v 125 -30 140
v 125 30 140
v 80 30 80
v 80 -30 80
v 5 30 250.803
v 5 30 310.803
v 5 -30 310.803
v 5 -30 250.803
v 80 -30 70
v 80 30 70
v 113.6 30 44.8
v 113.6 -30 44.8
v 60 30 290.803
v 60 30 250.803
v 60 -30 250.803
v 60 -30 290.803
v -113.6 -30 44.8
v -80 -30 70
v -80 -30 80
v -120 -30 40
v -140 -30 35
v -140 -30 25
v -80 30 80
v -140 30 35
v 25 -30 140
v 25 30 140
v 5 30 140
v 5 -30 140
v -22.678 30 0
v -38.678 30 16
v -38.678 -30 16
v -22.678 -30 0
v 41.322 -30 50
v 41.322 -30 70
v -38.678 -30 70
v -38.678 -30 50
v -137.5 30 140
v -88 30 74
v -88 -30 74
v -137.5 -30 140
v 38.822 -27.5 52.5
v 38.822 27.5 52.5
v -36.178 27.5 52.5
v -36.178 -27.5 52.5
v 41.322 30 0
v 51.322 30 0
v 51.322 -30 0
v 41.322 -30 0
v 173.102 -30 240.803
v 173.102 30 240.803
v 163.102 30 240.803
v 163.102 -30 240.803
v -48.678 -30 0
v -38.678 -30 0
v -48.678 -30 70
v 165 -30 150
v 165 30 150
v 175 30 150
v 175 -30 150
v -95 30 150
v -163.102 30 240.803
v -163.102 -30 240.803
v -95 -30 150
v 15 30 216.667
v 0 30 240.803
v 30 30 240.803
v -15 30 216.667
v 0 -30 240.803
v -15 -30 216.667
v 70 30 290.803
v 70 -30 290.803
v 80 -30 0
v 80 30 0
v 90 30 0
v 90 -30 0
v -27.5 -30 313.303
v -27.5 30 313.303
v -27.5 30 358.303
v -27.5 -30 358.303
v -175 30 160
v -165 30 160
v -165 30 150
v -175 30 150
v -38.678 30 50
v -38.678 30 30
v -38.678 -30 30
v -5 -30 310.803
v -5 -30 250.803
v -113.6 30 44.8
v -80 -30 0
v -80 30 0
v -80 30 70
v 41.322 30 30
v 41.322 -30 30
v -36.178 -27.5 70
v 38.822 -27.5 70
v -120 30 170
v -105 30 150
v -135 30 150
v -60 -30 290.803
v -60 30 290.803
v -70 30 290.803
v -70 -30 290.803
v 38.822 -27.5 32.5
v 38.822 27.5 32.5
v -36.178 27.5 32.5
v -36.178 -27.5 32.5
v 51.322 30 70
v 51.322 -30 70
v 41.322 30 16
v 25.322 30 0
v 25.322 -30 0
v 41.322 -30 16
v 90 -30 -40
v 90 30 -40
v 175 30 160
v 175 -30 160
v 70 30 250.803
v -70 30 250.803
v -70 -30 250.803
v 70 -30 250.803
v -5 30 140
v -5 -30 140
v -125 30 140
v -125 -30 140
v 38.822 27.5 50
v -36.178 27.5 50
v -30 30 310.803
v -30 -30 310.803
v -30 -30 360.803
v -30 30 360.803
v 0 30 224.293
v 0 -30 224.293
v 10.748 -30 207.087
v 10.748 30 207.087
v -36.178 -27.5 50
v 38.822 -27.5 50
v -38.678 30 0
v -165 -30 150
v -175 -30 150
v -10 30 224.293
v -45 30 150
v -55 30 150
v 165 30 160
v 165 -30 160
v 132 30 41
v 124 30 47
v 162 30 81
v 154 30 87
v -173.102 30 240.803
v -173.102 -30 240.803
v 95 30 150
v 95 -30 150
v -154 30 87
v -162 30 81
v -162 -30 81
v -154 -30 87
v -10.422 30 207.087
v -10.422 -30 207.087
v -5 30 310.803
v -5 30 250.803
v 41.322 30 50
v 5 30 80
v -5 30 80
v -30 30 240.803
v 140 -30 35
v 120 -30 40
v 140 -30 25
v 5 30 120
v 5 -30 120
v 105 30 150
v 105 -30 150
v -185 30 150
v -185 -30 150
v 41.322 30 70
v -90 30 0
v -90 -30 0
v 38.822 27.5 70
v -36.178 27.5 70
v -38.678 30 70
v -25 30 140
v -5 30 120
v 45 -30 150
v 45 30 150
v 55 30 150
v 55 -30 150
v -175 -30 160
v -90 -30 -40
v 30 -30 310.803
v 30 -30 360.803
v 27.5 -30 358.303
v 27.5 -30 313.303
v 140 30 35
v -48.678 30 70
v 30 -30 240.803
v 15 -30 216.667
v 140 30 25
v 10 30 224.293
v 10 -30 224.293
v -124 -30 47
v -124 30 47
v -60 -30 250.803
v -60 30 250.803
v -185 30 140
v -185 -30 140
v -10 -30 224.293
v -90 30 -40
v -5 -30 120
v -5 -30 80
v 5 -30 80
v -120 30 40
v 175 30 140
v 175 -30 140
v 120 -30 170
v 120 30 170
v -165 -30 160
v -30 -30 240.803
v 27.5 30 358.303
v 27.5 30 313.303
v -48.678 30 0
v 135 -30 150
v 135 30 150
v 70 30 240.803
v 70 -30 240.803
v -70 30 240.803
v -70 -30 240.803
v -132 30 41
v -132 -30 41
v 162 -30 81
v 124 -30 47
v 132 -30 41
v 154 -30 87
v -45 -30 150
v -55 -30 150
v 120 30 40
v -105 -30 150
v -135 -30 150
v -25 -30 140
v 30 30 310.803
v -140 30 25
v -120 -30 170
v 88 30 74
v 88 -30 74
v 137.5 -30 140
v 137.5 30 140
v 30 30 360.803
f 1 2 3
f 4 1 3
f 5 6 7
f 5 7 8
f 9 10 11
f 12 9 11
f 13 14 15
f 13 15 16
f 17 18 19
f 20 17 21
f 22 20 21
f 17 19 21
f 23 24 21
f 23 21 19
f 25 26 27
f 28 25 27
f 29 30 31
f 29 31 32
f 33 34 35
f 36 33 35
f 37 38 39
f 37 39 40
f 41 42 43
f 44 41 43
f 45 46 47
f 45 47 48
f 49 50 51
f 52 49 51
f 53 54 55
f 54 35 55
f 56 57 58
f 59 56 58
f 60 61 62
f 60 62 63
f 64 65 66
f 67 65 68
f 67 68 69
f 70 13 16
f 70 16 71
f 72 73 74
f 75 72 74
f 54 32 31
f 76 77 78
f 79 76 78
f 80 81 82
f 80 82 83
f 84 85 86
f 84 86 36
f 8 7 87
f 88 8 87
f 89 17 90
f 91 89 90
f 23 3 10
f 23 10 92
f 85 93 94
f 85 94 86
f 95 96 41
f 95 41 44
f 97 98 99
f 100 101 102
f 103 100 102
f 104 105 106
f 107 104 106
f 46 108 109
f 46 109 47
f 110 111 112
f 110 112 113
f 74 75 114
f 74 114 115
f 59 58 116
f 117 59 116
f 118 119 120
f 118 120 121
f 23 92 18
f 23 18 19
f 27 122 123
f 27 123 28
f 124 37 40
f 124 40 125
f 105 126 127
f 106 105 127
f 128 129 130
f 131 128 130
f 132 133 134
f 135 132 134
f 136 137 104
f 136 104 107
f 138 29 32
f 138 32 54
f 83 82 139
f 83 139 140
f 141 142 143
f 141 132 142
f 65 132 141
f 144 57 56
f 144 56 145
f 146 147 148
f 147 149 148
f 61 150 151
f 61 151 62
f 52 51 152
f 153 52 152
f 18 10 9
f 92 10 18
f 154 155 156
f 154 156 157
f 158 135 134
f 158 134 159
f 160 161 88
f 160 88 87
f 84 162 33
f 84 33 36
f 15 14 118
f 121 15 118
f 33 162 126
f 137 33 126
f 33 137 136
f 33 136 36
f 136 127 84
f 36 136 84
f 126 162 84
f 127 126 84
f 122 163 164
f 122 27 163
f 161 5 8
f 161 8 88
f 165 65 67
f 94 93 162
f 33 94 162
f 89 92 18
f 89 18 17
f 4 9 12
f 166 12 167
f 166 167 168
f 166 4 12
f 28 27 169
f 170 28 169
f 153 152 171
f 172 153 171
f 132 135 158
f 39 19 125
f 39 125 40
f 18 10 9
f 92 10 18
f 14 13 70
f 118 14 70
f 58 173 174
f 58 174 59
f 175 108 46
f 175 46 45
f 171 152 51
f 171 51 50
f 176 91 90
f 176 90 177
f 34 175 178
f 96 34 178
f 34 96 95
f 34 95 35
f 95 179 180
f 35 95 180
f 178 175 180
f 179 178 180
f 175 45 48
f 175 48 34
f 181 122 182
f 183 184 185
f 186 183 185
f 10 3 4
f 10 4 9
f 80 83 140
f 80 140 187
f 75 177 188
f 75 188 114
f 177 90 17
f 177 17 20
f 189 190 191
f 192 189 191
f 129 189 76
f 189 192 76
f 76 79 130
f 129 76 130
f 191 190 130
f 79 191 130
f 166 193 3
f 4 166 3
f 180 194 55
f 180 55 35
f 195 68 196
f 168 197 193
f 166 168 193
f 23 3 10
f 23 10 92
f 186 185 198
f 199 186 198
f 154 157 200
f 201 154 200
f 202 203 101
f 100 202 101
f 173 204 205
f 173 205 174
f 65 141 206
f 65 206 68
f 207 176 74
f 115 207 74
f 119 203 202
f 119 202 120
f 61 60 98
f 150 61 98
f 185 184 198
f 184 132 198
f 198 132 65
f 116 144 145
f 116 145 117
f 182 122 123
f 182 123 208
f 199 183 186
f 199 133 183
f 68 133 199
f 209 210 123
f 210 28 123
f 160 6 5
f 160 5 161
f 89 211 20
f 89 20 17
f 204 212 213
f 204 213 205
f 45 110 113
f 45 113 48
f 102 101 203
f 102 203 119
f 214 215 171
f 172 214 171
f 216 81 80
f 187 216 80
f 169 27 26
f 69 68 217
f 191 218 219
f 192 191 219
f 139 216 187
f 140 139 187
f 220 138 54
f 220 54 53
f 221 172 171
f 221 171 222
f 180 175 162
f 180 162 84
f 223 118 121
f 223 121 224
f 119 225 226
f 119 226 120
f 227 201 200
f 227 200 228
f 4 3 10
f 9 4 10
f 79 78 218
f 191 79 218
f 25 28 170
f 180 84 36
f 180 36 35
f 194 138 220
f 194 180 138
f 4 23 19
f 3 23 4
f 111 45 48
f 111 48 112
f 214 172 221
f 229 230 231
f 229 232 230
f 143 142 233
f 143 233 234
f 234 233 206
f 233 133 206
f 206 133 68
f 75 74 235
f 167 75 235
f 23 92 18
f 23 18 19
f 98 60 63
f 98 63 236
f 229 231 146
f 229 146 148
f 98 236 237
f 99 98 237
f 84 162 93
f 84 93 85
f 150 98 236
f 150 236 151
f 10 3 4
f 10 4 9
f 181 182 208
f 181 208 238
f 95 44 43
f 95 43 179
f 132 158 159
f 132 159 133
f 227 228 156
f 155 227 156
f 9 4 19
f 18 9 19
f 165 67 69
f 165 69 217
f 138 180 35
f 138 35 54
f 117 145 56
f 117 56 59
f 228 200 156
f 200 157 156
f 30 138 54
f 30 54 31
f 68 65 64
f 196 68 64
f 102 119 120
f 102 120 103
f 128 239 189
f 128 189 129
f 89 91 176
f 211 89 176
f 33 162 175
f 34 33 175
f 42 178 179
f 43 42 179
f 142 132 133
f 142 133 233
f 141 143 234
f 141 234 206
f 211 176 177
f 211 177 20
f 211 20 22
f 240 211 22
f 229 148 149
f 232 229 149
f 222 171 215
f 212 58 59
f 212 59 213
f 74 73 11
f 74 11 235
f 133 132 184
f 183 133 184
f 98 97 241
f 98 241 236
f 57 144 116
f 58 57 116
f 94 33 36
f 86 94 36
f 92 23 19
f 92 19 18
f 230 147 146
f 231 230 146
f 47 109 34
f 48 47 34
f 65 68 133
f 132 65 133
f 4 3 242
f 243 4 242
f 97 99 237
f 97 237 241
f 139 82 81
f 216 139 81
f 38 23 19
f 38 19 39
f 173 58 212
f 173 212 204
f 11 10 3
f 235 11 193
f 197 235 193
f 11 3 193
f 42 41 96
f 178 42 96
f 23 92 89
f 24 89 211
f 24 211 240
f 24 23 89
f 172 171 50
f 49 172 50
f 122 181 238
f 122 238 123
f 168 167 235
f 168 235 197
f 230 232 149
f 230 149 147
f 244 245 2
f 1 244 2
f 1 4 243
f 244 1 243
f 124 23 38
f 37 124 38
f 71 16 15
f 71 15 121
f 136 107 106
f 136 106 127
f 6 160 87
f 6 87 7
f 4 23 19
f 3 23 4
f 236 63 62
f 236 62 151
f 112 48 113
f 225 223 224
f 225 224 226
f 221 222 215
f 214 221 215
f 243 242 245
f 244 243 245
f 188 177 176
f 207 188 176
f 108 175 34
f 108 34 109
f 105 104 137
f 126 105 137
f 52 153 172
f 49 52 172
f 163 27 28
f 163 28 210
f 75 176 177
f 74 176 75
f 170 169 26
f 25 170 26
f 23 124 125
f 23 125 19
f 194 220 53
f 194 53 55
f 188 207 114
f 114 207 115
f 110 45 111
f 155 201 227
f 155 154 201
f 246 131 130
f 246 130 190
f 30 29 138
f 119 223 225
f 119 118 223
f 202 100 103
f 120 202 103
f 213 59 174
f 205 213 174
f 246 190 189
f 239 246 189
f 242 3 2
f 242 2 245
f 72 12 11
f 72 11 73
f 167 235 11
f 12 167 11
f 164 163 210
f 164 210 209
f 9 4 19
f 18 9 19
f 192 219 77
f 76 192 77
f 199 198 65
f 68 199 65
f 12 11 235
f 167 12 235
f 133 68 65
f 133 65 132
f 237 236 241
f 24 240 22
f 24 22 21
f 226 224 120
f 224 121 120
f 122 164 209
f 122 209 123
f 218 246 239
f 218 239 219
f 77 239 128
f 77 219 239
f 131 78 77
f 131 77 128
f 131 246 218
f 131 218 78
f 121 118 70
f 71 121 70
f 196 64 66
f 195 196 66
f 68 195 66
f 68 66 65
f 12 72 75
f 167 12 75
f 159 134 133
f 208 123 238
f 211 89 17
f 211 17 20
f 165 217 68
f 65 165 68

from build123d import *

# Parameters (mm, degrees)
F0_W      = 180
F0_H      = 60
F1_DEPTH  = 40
F3_DEPTH  = 60
F2_W      = 10
F2_H      = 10
F2_W_2    = 80
F2_H_2    = 20
F5_DEPTH  = 60
F6_T      = -2.5
F7_DEPTH  = 60
F8_T      = -2.5
F9_DEPTH  = 60
F10_DEPTH = 60
F11_DEPTH = 60
F12_DEPTH = 60
F2_H_3    = 40
F14_DEPTH = 60
F15_T     = -2.5


with BuildPart() as f1:
    # F0 (on Top) → F1 (new body)
    with BuildSketch(Plane.XY):
        Rectangle(F0_W, F0_H)
    extrude(amount=-F1_DEPTH)


with BuildPart() as f3:
    # F2 (on face) → F3 (new body)
    with BuildSketch(Plane(origin=(0, 30, 0), x_dir=(-1, 0, 0), z_dir=(0, 1, 0))):
        Polygon((80, 0), (90, 0), (120.0000012588, 39.9999990559), (113.6000014098, 44.7999989426), align=None)
    extrude(amount=-F3_DEPTH)


with BuildPart() as f3b:
    # F2 (on face) → F3, piece 2 (new body)
    with BuildSketch(Plane(origin=(0, 30, 0), x_dir=(-1, 0, 0), z_dir=(0, 1, 0))):
        Polygon((124, 47), (132, 41), (162, 81), (154, 87), align=None)
    extrude(amount=-F3_DEPTH)


with BuildPart() as f3c:
    # F2 (on face) → F3, piece 3 (new body)
    with BuildSketch(Plane(origin=(0, 30, 0), x_dir=(-1, 0, 0), z_dir=(0, 1, 0))):
        Polygon((125, 140), (80, 80), (88, 74), (137.5, 140), align=None)
    extrude(amount=-F3_DEPTH)


with BuildPart() as f3d:
    # F2 (on face) → F3, piece 4 (new body)
    with BuildSketch(Plane(origin=(0, 30, 0), x_dir=(-1, 0, 0), z_dir=(0, 1, 0))):
        Polygon((5, 140), (5, 120), (25, 140), align=None)
    extrude(amount=-F3_DEPTH)


with BuildPart() as f3e:
    # F2 (on face) → F3, piece 5 (new body)
    with BuildSketch(Plane(origin=(0, 30, 0), x_dir=(-1, 0, 0), z_dir=(0, 1, 0))):
        Polygon((120, 150), (135, 150), (120, 170), (105, 150), align=None)
    extrude(amount=-F3_DEPTH)


with BuildPart() as f3f:
    # F2 (on face) → F3, piece 6 (new body)
    with BuildSketch(Plane(origin=(0, 30, 0), x_dir=(-1, 0, 0), z_dir=(0, 1, 0))):
        with Locations((170, 155)):
            Rectangle(F2_W, F2_H)
    extrude(amount=-F3_DEPTH)


with BuildPart() as f3g:
    # F2 (on face) → F3, piece 7 (new body)
    with BuildSketch(Plane(origin=(0, 30, 0), x_dir=(-1, 0, 0), z_dir=(0, 1, 0))):
        Polygon((10.4221828335, 207.086564962), (45, 150), (55, 150), (10, 224.293163473), (0, 240.8027553558), (0, 224.293163473), align=None)
    extrude(amount=-F3_DEPTH)


with BuildPart() as f4_1:
    # F4: instance of F3
    add(f3.part.mirror(Plane.YZ))


with BuildPart() as f4_2:
    # F4: instance of F3b
    add(f3b.part.mirror(Plane.YZ))


with BuildPart() as f4_3:
    # F4: instance of F3c
    add(f3c.part.mirror(Plane.YZ))


with BuildPart() as f4_4:
    # F4: instance of F3d
    add(f3d.part.mirror(Plane.YZ))


with BuildPart() as f4_5:
    # F4: instance of F3f
    add(f3f.part.mirror(Plane.YZ))


with BuildPart() as f4_6:
    # F4: instance of F3e
    add(f3e.part.mirror(Plane.YZ))


with BuildPart() as f4_7:
    # F4: instance of F3g
    add(f3g.part.mirror(Plane.YZ))


with BuildPart() as f5:
    # F2 (on face) → F5 (new body)
    with BuildSketch(Plane(origin=(0, 30, 0), x_dir=(-1, 0, 0), z_dir=(0, 1, 0))):
        with Locations((-1.3216203451, 40)):
            Rectangle(F2_W_2, F2_H_2)
    extrude(amount=-F5_DEPTH)

    # F6
    f6_openings = [f5.faces().sort_by_distance(p)[0] for p in [
        (1.32162, 0, 50),
    ]]
    offset(amount=F6_T, openings=f6_openings)


with BuildPart() as f7:
    # F2 (on face) → F7 (new body)
    with BuildSketch(Plane(origin=(0, 30, 0), x_dir=(-1, 0, 0), z_dir=(0, 1, 0))):
        with Locations((-1.3216203451, 60)):
            Rectangle(F2_W_2, F2_H_2)
    extrude(amount=-F7_DEPTH)

    # F8
    f8_openings = [f7.faces().sort_by_distance(p)[0] for p in [
        (1.32162, 0, 70),
    ]]
    offset(amount=F8_T, openings=f8_openings)


with BuildPart() as f7b:
    # F2 (on face) → F7, piece 2 (new body)
    with BuildSketch(Plane(origin=(0, 30, 0), x_dir=(-1, 0, 0), z_dir=(0, 1, 0))):
        Polygon((-10.74806, 207.086564962), (10.4221828335, 207.086564962), (0, 224.293163473), align=None)
    extrude(amount=-F7_DEPTH)


with BuildPart() as f9:
    # F2 (on face) → F9 (new body)
    with BuildSketch(Plane(origin=(0, 30, 0), x_dir=(-1, 0, 0), z_dir=(0, 1, 0))):
        Polygon((38.6783796549, 0), (48.6783796549, 0), (48.6783796549, 70), (38.6783796549, 70), (38.6783796549, 50), (38.6783796549, 30), (38.6783796549, 16), align=None)
    extrude(amount=-F9_DEPTH)


with BuildPart() as f9b:
    # F2 (on face) → F9, piece 2 (new body)
    with BuildSketch(Plane(origin=(0, 30, 0), x_dir=(-1, 0, 0), z_dir=(0, 1, 0))):
        Polygon((-51.3216203451, 70), (-51.3216203451, 0), (-41.3216203451, 0), (-41.3216203451, 16), (-41.3216203451, 30), (-41.3216203451, 50), (-41.3216203451, 70), align=None)
    extrude(amount=-F9_DEPTH)


with BuildPart() as f9c:
    # F2 (on face) → F9, piece 3 (new body)
    with BuildSketch(Plane(origin=(0, 30, 0), x_dir=(-1, 0, 0), z_dir=(0, 1, 0))):
        Polygon((-5, 80), (5, 80), (5, 120), (5, 140), (-5, 140), align=None)
    extrude(amount=-F9_DEPTH)


with BuildPart() as f10:
    # F2 (on face) → F10 (new body)
    with BuildSketch(Plane(origin=(0, 30, 0), x_dir=(-1, 0, 0), z_dir=(0, 1, 0))):
        Polygon((-41.3216203451, 0), (-25.3216203451, 0), (-41.3216203451, 16), align=None)
    extrude(amount=-F10_DEPTH)


with BuildPart() as f10b:
    # F2 (on face) → F10, piece 2 (new body)
    with BuildSketch(Plane(origin=(0, 30, 0), x_dir=(-1, 0, 0), z_dir=(0, 1, 0))):
        Polygon((22.6783796549, 0), (38.6783796549, 0), (38.6783796549, 16), align=None)
    extrude(amount=-F10_DEPTH)


with BuildPart() as f10c:
    # F2 (on face) → F10, piece 3 (new body)
    with BuildSketch(Plane(origin=(0, 30, 0), x_dir=(-1, 0, 0), z_dir=(0, 1, 0))):
        Polygon((25, 140), (125, 140), (137.5, 140), (185, 140), (185, 150), (175, 150), (165, 150), (135, 150), (120, 150), (105, 150), (95, 150), (55, 150), (45, 150), (-175, 150), (-175, 140), (-5, 140), (5, 140), align=None)
    extrude(amount=-F10_DEPTH)


with BuildPart() as f10d:
    # F2 (on face) → F10, piece 4 (new body)
    with BuildSketch(Plane(origin=(0, 30, 0), x_dir=(-1, 0, 0), z_dir=(0, 1, 0))):
        Polygon((48.6783796549, 70), (80, 70), (80, 80), (5, 80), (-5, 80), (-80, 80), (-80, 70), (-51.3216203451, 70), (-41.3216203451, 70), (38.6783796549, 70), align=None)
    extrude(amount=-F10_DEPTH)


with BuildPart() as f10e:
    # F2 (on face) → F10, piece 5 (new body)
    with BuildSketch(Plane(origin=(0, 30, 0), x_dir=(-1, 0, 0), z_dir=(0, 1, 0))):
        Polygon((30, 240.8027553558), (0, 240.8027553558), (15, 216.6666666667), align=None)
    extrude(amount=-F10_DEPTH)


with BuildPart() as f11:
    # F2 (on face) → F11 (new body)
    with BuildSketch(Plane(origin=(0, 30, 0), x_dir=(-1, 0, 0), z_dir=(0, 1, 0))):
        Polygon((48.6783796549, 70), (80, 70), (80, 80), (5, 80), (-5, 80), (-80, 80), (-80, 70), (-51.3216203451, 70), (-41.3216203451, 70), (38.6783796549, 70), align=None)
    extrude(amount=-F11_DEPTH)


with BuildPart() as f11b:
    # F2 (on face) → F11, piece 2 (new body)
    with BuildSketch(Plane(origin=(0, 30, 0), x_dir=(-1, 0, 0), z_dir=(0, 1, 0))):
        Polygon((-70, 240.8027553558), (0, 240.8027553558), (30, 240.8027553558), (70, 240.8027553558), (70, 250.8027553558), (60, 250.8027553558), (15, 250.8027553558), (5, 250.8027553558), (0, 250.8027553558), (-5, 250.8027553558), (-70, 250.8027553558), align=None)
    extrude(amount=-F11_DEPTH)


with BuildPart() as f12:
    # F2 (on face) → F12 (new body)
    with BuildSketch(Plane(origin=(0, 30, 0), x_dir=(-1, 0, 0), z_dir=(0, 1, 0))):
        Polygon((113.6000014098, 44.7999989426), (120.0000012588, 39.9999990559), (140, 25), (140, 35), (132, 41), (124, 47), (88, 74), (80, 80), (80, 70), align=None)
    extrude(amount=-F12_DEPTH)


with BuildPart() as f12b:
    # F2 (on face) → F12, piece 2 (new body)
    with BuildSketch(Plane(origin=(0, 30, 0), x_dir=(-1, 0, 0), z_dir=(0, 1, 0))):
        Polygon((163.1020665169, 240.8027553558), (95, 150), (105, 150), (120, 170), (173.1020665169, 240.8027553558), align=None)
    extrude(amount=-F12_DEPTH)


with BuildPart() as f12c:
    # F2 (on face) → F12, piece 3 (new body)
    with BuildSketch(Plane(origin=(0, 30, 0), x_dir=(-1, 0, 0), z_dir=(0, 1, 0))):
        with Locations((65, 270.8027553558)):
            Rectangle(F2_W, F2_H_3)
    extrude(amount=-F12_DEPTH)


with BuildPart() as f12d:
    # F2 (on face) → F12, piece 4 (new body)
    with BuildSketch(Plane(origin=(0, 30, 0), x_dir=(-1, 0, 0), z_dir=(0, 1, 0))):
        Polygon((-5, 310.8027553558), (-5, 250.8027553558), (0, 250.8027553558), (5, 250.8027553558), (5, 310.8027553558), align=None)
    extrude(amount=-F12_DEPTH)


with BuildPart() as f13_1:
    # F13: instance of F12
    add(f12.part.mirror(Plane.YZ))


with BuildPart() as f13_2:
    # F13: instance of F12b
    add(f12b.part.mirror(Plane.YZ))


with BuildPart() as f13_3:
    # F13: instance of F10e
    add(f10e.part.mirror(Plane.YZ))


with BuildPart() as f13_4:
    # F13: instance of F12c
    add(f12c.part.mirror(Plane.YZ))


with BuildPart() as f14:
    # F2 (on face) → F14 (new body)
    with BuildSketch(Plane(origin=(0, 30, 0), x_dir=(-1, 0, 0), z_dir=(0, 1, 0))):
        Polygon((-30, 310.8027553558), (-5, 310.8027553558), (5, 310.8027553558), (30, 310.8027553558), (30, 360.8027553558), (-30, 360.8027553558), align=None)
    extrude(amount=-F14_DEPTH)

    # F15
    f15_openings = [f14.faces().sort_by_distance(p)[0] for p in [
        (0, -30, 335.802755),
        (0, 30, 335.802755),
    ]]
    offset(amount=F15_T, openings=f15_openings)


solid = Compound([f1.part, f3.part, f3b.part, f3c.part, f3d.part, f3e.part, f3f.part, f3g.part, f4_1.part, f4_2.part, f4_3.part, f4_4.part, f4_5.part, f4_6.part, f4_7.part, f5.part, f7.part, f7b.part, f9.part, f9b.part, f9c.part, f10.part, f10b.part, f10c.part, f10d.part, f10e.part, f11.part, f11b.part, f12.part, f12b.part, f12c.part, f12d.part, f13_1.part, f13_2.part, f13_3.part, f13_4.part, f14.part])
